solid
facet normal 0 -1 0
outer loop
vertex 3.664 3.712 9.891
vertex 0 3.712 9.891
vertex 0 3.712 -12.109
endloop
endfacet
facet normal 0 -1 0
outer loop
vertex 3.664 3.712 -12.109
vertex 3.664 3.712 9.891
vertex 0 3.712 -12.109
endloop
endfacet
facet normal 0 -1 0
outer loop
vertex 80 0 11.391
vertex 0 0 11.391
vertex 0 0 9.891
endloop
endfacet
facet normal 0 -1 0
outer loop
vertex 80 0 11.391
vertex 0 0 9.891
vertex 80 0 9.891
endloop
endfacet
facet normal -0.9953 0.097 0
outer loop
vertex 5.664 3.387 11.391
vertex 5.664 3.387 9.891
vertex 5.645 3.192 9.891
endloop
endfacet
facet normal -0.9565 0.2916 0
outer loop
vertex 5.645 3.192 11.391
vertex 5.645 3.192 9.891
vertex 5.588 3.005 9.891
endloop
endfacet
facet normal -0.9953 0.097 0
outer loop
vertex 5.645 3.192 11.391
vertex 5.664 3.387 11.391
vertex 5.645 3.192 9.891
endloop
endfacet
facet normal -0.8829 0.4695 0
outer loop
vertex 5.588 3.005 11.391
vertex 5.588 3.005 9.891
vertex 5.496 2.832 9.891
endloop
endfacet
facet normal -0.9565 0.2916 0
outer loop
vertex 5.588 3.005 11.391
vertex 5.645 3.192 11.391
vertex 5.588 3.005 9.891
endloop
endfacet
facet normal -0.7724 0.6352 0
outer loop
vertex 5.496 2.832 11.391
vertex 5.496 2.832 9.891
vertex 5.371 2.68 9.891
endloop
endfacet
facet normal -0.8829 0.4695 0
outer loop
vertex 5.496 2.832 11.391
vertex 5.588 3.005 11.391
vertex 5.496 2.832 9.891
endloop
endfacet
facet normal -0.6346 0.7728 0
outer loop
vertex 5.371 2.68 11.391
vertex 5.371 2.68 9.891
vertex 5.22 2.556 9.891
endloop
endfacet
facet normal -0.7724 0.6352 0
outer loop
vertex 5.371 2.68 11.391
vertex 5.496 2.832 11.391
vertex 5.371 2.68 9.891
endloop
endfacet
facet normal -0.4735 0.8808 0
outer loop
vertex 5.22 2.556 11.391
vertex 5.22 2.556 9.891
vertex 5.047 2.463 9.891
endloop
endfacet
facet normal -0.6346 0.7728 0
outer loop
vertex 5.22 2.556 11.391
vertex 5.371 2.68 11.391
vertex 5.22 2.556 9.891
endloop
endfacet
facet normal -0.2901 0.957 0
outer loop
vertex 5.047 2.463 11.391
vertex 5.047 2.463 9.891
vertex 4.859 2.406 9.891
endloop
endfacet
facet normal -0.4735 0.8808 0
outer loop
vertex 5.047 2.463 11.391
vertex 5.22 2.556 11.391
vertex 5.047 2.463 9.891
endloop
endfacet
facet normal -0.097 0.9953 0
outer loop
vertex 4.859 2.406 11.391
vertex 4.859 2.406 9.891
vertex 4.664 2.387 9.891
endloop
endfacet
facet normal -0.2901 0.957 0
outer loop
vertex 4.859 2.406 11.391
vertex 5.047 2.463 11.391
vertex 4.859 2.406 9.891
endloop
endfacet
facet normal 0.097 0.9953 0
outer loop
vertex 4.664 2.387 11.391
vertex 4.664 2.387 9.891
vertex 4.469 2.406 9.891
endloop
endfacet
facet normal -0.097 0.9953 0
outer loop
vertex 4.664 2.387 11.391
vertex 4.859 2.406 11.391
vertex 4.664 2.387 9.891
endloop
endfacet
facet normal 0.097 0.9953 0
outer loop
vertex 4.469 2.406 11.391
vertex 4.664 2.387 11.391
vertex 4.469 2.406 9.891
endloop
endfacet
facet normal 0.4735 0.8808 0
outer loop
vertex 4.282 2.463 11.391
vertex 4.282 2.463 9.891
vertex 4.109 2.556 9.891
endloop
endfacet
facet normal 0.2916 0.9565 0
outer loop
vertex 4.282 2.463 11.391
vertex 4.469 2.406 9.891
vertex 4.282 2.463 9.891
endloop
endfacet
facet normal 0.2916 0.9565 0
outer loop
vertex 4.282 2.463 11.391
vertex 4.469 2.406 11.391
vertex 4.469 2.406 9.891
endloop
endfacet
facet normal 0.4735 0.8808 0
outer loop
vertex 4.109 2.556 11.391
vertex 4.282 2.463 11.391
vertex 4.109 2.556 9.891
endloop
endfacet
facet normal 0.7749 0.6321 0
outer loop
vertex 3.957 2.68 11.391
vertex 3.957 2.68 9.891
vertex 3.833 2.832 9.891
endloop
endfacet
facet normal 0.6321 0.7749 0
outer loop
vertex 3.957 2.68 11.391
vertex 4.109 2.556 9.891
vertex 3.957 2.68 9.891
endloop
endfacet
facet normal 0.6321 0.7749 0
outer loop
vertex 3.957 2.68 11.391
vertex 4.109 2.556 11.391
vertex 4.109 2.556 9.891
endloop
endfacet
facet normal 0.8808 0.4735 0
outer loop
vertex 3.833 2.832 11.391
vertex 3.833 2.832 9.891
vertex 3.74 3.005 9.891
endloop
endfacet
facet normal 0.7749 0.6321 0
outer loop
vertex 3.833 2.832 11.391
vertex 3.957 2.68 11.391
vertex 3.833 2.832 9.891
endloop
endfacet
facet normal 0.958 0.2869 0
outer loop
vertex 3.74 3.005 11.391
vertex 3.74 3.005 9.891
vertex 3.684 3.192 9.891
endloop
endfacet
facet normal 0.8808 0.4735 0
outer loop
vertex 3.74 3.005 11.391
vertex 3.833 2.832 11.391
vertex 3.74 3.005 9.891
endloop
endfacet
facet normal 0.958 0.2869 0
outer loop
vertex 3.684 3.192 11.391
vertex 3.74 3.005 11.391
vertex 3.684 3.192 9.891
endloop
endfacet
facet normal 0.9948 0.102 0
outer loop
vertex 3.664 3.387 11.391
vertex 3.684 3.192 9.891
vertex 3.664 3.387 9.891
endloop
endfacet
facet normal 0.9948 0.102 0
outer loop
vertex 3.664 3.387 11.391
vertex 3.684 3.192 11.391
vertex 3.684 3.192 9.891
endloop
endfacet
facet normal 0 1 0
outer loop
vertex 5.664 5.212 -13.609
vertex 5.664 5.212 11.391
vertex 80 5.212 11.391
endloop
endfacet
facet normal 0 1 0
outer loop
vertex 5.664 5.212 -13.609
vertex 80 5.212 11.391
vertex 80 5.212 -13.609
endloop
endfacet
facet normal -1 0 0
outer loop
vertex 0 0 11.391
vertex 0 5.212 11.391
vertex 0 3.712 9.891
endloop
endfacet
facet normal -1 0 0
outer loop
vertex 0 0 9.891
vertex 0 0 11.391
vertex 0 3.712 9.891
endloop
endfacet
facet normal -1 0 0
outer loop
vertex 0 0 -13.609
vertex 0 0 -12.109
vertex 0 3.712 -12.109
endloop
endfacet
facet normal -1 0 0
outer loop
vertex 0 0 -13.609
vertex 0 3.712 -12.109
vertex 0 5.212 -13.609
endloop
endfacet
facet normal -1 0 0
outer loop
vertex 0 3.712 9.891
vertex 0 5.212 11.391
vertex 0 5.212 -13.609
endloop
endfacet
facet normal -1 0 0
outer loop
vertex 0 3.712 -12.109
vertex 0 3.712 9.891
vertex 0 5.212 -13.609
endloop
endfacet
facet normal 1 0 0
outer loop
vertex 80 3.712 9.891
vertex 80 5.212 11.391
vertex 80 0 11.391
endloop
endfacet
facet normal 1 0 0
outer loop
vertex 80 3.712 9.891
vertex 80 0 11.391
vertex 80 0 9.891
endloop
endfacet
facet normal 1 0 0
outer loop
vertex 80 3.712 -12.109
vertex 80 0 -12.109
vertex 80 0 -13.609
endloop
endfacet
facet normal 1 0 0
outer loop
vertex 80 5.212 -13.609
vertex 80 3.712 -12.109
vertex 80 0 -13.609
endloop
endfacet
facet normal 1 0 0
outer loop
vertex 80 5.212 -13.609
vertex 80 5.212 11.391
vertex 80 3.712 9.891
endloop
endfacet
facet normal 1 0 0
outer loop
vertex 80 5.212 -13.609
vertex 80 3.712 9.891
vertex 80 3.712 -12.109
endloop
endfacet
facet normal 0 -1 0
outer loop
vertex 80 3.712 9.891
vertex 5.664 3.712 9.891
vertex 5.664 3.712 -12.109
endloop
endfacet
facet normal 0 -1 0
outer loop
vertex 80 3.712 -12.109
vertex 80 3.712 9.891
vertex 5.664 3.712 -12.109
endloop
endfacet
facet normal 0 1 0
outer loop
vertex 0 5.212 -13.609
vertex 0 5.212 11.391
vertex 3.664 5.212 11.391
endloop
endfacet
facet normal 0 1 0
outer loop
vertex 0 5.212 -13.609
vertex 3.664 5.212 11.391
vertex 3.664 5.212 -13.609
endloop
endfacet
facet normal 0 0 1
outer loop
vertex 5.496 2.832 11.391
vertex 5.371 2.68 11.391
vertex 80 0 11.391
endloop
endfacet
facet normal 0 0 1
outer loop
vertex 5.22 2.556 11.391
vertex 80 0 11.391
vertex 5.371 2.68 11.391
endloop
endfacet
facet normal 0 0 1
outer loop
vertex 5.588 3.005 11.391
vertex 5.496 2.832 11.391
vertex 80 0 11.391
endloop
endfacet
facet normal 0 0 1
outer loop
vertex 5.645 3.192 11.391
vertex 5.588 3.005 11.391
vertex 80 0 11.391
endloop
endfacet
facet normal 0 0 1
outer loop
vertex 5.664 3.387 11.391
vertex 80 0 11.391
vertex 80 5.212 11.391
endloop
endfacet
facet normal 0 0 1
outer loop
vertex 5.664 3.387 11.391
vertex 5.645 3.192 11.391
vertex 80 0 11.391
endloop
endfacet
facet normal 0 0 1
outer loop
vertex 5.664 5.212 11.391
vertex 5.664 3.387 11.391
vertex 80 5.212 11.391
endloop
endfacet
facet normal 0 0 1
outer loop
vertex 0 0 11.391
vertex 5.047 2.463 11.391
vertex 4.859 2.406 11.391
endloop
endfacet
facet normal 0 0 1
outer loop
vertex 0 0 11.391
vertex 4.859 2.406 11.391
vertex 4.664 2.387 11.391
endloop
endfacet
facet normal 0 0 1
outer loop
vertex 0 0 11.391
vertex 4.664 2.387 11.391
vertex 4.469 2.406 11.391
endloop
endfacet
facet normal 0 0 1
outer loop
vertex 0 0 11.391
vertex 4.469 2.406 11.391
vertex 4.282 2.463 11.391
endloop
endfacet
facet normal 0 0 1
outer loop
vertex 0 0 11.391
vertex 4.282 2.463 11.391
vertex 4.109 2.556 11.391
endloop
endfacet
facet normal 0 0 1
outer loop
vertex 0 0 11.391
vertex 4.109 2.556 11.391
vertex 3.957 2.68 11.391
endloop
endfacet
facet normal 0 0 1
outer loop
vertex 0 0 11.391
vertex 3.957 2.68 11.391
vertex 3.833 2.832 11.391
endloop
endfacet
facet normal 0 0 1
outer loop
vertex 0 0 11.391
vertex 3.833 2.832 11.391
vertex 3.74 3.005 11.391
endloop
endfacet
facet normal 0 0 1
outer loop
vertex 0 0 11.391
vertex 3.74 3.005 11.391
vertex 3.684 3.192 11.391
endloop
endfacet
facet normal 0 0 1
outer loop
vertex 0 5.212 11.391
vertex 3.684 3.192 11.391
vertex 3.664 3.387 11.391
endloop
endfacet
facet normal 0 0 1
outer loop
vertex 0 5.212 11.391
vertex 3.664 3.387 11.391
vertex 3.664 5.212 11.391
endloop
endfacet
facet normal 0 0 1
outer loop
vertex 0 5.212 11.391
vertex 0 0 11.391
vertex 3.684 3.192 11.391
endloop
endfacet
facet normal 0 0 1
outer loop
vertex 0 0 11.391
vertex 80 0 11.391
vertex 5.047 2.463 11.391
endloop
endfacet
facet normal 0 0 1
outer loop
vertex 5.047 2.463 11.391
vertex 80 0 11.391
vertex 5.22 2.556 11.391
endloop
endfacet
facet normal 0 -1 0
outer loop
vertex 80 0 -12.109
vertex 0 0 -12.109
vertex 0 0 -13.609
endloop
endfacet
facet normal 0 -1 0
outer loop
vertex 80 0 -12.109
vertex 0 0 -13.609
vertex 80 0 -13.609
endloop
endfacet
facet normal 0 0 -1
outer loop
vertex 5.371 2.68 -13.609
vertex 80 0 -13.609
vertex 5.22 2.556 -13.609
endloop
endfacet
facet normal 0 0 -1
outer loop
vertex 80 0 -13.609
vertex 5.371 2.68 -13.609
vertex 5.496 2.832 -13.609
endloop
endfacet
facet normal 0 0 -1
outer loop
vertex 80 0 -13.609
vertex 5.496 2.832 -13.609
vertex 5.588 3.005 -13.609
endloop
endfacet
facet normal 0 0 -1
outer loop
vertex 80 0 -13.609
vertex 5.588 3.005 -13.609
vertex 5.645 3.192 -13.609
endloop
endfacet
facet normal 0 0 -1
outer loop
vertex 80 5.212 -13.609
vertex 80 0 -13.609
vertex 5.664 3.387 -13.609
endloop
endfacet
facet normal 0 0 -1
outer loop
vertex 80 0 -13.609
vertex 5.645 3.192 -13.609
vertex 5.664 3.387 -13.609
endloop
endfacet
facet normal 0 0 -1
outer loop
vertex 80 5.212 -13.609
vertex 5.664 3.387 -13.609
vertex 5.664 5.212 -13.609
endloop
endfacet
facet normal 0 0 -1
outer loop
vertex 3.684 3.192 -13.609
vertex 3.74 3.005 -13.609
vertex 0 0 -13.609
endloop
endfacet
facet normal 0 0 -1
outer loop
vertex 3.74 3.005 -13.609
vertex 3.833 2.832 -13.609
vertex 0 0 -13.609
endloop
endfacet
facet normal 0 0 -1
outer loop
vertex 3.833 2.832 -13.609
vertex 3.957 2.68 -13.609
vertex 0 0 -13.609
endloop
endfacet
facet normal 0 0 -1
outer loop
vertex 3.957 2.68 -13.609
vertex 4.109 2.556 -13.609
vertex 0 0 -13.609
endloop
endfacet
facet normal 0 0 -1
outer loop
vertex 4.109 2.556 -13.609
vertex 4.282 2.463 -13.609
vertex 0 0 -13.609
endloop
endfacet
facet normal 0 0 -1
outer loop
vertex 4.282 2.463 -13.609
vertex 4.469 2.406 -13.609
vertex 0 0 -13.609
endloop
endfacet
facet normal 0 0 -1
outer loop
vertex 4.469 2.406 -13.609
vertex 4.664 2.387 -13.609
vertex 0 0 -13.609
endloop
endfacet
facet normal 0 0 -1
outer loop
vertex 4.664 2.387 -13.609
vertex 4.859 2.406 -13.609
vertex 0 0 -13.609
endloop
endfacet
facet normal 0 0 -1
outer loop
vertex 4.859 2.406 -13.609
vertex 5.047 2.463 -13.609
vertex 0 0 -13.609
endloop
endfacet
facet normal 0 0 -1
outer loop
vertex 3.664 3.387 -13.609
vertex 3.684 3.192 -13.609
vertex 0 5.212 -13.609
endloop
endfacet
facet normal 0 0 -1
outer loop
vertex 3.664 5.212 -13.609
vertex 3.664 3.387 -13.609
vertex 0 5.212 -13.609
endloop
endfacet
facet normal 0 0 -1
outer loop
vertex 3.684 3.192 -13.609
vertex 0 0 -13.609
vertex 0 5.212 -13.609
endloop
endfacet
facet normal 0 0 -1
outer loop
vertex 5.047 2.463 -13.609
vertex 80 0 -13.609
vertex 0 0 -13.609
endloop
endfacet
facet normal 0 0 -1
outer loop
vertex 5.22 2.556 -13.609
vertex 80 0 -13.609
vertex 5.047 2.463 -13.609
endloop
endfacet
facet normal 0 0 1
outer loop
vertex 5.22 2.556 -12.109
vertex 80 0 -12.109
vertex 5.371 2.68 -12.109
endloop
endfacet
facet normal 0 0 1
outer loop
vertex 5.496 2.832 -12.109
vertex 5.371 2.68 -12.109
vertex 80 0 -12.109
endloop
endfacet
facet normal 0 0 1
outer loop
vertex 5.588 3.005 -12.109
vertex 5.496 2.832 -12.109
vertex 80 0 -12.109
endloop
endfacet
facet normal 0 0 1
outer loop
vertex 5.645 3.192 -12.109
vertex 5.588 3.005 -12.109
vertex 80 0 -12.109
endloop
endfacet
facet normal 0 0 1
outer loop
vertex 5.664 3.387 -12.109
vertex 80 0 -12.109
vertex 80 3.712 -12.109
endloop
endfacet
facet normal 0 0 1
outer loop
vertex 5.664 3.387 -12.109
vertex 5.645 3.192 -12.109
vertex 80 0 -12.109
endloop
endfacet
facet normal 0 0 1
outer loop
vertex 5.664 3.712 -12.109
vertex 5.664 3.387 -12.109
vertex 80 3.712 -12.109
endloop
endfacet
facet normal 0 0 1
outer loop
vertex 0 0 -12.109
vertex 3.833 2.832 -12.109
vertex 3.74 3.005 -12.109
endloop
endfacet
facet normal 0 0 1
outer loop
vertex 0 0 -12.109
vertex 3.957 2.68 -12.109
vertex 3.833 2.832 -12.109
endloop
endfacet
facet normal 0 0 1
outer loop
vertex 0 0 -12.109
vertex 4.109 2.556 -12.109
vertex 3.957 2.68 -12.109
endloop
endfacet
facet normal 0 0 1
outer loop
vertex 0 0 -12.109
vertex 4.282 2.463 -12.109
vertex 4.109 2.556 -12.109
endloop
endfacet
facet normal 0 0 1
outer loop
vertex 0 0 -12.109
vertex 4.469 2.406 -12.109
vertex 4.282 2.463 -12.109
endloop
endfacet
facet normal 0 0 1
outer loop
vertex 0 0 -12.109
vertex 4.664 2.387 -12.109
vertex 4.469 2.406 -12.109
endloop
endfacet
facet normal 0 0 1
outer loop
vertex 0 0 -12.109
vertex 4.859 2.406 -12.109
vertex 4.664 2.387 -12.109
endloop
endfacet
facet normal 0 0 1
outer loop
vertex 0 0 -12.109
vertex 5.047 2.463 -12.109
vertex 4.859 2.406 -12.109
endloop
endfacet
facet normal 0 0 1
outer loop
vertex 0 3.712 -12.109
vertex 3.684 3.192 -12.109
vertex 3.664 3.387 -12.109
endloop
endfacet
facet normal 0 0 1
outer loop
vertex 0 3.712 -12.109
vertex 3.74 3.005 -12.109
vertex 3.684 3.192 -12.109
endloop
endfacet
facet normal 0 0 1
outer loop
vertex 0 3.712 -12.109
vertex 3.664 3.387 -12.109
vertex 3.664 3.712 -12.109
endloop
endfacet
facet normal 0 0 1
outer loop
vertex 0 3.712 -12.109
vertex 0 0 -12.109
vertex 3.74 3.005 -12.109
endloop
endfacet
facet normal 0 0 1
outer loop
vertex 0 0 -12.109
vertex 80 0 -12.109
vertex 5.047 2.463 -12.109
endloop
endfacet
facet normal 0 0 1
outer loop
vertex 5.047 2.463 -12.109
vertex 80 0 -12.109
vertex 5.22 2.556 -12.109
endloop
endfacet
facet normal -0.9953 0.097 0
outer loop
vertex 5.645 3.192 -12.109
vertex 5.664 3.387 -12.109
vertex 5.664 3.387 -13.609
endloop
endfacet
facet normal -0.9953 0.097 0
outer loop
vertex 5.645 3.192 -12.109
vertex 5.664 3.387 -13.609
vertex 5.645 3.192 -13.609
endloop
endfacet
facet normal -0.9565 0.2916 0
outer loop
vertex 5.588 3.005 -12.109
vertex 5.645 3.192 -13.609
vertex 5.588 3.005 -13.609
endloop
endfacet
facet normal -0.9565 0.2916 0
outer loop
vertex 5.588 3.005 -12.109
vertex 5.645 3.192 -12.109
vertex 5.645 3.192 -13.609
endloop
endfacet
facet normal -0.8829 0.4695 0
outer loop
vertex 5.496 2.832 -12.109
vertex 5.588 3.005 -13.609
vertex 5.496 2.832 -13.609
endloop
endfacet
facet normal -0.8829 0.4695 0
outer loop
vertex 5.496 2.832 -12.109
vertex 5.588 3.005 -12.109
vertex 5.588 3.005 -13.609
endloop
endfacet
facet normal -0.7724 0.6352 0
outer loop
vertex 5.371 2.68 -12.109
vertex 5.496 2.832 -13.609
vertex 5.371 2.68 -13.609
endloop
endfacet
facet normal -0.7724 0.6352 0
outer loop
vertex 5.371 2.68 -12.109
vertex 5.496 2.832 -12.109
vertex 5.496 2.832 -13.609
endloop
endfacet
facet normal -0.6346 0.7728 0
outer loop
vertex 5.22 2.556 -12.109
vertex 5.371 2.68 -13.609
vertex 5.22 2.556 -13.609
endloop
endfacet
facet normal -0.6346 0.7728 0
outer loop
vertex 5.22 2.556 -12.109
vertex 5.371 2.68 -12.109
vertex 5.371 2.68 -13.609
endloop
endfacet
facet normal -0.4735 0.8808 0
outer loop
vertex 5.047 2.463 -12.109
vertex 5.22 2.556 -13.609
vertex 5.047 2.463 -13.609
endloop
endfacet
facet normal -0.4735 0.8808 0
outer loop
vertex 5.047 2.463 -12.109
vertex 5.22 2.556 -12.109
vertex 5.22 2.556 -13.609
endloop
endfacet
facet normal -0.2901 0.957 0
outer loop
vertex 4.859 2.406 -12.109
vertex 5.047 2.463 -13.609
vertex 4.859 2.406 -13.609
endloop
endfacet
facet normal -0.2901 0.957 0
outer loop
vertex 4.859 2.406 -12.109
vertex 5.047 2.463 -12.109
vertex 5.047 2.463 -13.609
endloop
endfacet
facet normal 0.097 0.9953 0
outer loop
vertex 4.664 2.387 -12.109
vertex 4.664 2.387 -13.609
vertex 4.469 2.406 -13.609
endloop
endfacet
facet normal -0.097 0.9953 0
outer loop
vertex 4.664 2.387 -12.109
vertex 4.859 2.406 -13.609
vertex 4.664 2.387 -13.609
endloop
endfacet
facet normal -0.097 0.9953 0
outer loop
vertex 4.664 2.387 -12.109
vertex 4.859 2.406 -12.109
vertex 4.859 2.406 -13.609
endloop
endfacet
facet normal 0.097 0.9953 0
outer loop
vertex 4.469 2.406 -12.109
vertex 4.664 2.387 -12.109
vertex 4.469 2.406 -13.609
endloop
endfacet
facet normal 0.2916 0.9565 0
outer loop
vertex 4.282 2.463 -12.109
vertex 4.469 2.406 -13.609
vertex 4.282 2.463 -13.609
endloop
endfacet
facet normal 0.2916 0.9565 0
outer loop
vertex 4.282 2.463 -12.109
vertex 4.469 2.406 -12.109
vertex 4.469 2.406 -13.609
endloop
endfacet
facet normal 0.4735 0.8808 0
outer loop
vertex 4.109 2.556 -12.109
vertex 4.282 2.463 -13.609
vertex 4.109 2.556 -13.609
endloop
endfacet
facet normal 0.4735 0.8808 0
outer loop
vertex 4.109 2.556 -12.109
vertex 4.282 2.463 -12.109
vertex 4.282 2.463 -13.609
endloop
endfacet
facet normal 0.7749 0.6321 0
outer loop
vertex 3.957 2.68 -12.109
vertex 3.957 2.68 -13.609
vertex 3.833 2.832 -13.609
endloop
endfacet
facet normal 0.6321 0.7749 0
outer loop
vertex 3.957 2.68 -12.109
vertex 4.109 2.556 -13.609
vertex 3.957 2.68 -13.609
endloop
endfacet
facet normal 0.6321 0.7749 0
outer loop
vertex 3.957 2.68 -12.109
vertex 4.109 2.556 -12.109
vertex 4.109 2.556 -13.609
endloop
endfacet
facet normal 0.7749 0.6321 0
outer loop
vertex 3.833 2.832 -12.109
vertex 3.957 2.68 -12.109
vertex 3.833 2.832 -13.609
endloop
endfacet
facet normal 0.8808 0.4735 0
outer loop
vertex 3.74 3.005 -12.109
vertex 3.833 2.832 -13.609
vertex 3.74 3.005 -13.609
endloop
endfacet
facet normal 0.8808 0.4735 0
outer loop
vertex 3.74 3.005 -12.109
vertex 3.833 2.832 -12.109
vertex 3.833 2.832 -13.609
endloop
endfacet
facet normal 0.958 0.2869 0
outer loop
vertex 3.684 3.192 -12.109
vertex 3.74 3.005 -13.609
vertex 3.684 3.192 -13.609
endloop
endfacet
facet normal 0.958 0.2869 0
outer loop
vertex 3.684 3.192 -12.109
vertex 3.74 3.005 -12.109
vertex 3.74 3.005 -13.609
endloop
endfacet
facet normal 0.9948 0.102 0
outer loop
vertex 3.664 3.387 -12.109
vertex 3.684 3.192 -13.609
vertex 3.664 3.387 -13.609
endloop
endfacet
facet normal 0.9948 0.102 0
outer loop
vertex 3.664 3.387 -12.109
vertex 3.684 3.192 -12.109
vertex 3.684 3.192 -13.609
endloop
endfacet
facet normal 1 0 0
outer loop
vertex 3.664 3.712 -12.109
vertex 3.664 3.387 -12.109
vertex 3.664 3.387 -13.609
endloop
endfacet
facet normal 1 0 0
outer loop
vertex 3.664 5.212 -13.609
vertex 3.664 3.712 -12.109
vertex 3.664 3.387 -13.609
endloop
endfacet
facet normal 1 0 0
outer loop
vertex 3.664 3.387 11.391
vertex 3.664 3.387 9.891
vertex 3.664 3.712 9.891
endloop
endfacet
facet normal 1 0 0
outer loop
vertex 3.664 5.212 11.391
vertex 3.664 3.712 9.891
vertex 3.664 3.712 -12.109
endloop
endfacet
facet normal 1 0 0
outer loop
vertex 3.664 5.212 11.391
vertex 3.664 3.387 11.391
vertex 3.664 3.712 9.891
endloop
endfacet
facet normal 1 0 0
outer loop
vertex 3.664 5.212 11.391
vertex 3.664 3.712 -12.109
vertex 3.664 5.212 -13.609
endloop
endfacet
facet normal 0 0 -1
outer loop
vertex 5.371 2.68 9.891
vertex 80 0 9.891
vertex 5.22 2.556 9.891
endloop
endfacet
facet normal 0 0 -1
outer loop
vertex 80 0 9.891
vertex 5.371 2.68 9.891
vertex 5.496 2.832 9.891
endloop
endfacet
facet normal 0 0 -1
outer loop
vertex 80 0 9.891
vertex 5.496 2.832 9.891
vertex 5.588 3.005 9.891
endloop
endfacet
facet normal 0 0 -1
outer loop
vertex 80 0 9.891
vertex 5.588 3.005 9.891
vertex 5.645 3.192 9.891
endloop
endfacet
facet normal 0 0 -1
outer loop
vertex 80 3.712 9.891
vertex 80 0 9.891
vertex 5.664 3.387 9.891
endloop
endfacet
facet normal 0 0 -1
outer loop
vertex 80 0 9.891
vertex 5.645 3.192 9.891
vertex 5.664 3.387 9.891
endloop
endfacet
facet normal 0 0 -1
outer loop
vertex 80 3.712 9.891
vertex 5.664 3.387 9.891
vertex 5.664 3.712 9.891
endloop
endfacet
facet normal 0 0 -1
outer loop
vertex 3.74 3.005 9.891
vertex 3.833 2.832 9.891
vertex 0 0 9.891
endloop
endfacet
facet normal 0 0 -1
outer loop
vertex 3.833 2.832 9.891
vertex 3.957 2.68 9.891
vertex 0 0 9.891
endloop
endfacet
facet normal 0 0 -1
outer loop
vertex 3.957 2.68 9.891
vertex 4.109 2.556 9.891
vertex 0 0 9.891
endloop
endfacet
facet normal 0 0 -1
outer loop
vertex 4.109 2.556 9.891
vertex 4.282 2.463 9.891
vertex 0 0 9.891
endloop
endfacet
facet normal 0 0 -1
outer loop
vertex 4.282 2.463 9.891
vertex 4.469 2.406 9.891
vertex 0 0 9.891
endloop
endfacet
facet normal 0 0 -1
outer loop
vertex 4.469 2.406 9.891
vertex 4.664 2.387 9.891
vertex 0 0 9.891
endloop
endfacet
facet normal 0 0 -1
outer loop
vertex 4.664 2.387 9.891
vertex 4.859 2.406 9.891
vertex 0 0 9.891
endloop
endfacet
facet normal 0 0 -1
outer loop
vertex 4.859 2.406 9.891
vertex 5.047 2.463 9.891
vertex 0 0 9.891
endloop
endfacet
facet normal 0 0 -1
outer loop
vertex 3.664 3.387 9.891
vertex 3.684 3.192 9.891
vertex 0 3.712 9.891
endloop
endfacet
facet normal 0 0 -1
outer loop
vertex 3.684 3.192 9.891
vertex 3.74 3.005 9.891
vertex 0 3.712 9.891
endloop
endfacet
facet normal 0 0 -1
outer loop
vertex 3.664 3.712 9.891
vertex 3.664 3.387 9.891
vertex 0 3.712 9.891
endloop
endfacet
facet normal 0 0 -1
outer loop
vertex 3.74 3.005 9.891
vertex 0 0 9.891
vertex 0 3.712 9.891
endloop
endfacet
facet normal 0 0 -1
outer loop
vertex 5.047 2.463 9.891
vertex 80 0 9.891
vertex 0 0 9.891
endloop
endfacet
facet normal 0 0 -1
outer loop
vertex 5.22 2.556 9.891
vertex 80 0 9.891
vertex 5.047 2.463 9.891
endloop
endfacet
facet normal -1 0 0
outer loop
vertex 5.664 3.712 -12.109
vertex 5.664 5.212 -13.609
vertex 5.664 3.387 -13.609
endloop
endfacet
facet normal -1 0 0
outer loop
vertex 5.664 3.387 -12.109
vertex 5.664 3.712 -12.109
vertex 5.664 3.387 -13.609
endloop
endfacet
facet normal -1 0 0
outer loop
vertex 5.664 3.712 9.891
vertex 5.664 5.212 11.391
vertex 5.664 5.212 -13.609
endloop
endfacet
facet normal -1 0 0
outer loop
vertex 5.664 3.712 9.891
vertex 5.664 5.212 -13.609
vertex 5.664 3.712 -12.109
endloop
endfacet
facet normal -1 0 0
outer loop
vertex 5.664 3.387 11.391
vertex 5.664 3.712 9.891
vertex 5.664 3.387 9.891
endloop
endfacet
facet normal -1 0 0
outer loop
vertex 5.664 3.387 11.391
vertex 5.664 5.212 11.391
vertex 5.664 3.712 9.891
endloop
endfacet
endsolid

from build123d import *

# Parameters (mm, degrees)
SKETCH_1_W          = 25
SKETCH_1_H          = 10.9
SKETCH_1_W_2        = 22
SKETCH_1_H_2        = 7.9
EXTRUDE_1_DEPTH     = 80
SKETCH_3_W          = 141.586461115
SKETCH_3_H          = 11.077241851
CUT_EXTRUDE_1_DEPTH = 50


with BuildPart() as part:
    # 草图1 → 凸台-拉伸1 (new body)
    with BuildSketch(Plane(origin=(0, 0, 0), x_dir=(0, 0, -1), z_dir=(1, 0, 0))):
        with Locations((1.108975332, -0.23755131)):
            Rectangle(SKETCH_1_W, SKETCH_1_H)
        with Locations((1.108975332, -0.23755131)):
            Rectangle(SKETCH_1_W_2, SKETCH_1_H_2, mode=Mode.SUBTRACT)
    extrude(amount=EXTRUDE_1_DEPTH)

    # 草图3 → 切除-拉伸1 (cut)
    with BuildSketch(Plane.XY.offset(11.391024668)):
        with BuildLine():
            Line((3.664305979, 3.387279606), (3.664305979, 5.21244869))
            Line((3.664305979, 5.21244869), (5.664305979, 5.21244869))
            Line((5.664305979, 5.21244869), (5.664305979, 3.387279606))
            ThreePointArc((5.664305979, 3.387279606), (4.664305979, 2.387279606), (3.664305979, 3.387279606))
        make_face()
        with Locations((67.57974516, -5.538620926)):
            Rectangle(SKETCH_3_W, SKETCH_3_H)
    extrude(amount=-CUT_EXTRUDE_1_DEPTH, mode=Mode.SUBTRACT)


solid = part.part
